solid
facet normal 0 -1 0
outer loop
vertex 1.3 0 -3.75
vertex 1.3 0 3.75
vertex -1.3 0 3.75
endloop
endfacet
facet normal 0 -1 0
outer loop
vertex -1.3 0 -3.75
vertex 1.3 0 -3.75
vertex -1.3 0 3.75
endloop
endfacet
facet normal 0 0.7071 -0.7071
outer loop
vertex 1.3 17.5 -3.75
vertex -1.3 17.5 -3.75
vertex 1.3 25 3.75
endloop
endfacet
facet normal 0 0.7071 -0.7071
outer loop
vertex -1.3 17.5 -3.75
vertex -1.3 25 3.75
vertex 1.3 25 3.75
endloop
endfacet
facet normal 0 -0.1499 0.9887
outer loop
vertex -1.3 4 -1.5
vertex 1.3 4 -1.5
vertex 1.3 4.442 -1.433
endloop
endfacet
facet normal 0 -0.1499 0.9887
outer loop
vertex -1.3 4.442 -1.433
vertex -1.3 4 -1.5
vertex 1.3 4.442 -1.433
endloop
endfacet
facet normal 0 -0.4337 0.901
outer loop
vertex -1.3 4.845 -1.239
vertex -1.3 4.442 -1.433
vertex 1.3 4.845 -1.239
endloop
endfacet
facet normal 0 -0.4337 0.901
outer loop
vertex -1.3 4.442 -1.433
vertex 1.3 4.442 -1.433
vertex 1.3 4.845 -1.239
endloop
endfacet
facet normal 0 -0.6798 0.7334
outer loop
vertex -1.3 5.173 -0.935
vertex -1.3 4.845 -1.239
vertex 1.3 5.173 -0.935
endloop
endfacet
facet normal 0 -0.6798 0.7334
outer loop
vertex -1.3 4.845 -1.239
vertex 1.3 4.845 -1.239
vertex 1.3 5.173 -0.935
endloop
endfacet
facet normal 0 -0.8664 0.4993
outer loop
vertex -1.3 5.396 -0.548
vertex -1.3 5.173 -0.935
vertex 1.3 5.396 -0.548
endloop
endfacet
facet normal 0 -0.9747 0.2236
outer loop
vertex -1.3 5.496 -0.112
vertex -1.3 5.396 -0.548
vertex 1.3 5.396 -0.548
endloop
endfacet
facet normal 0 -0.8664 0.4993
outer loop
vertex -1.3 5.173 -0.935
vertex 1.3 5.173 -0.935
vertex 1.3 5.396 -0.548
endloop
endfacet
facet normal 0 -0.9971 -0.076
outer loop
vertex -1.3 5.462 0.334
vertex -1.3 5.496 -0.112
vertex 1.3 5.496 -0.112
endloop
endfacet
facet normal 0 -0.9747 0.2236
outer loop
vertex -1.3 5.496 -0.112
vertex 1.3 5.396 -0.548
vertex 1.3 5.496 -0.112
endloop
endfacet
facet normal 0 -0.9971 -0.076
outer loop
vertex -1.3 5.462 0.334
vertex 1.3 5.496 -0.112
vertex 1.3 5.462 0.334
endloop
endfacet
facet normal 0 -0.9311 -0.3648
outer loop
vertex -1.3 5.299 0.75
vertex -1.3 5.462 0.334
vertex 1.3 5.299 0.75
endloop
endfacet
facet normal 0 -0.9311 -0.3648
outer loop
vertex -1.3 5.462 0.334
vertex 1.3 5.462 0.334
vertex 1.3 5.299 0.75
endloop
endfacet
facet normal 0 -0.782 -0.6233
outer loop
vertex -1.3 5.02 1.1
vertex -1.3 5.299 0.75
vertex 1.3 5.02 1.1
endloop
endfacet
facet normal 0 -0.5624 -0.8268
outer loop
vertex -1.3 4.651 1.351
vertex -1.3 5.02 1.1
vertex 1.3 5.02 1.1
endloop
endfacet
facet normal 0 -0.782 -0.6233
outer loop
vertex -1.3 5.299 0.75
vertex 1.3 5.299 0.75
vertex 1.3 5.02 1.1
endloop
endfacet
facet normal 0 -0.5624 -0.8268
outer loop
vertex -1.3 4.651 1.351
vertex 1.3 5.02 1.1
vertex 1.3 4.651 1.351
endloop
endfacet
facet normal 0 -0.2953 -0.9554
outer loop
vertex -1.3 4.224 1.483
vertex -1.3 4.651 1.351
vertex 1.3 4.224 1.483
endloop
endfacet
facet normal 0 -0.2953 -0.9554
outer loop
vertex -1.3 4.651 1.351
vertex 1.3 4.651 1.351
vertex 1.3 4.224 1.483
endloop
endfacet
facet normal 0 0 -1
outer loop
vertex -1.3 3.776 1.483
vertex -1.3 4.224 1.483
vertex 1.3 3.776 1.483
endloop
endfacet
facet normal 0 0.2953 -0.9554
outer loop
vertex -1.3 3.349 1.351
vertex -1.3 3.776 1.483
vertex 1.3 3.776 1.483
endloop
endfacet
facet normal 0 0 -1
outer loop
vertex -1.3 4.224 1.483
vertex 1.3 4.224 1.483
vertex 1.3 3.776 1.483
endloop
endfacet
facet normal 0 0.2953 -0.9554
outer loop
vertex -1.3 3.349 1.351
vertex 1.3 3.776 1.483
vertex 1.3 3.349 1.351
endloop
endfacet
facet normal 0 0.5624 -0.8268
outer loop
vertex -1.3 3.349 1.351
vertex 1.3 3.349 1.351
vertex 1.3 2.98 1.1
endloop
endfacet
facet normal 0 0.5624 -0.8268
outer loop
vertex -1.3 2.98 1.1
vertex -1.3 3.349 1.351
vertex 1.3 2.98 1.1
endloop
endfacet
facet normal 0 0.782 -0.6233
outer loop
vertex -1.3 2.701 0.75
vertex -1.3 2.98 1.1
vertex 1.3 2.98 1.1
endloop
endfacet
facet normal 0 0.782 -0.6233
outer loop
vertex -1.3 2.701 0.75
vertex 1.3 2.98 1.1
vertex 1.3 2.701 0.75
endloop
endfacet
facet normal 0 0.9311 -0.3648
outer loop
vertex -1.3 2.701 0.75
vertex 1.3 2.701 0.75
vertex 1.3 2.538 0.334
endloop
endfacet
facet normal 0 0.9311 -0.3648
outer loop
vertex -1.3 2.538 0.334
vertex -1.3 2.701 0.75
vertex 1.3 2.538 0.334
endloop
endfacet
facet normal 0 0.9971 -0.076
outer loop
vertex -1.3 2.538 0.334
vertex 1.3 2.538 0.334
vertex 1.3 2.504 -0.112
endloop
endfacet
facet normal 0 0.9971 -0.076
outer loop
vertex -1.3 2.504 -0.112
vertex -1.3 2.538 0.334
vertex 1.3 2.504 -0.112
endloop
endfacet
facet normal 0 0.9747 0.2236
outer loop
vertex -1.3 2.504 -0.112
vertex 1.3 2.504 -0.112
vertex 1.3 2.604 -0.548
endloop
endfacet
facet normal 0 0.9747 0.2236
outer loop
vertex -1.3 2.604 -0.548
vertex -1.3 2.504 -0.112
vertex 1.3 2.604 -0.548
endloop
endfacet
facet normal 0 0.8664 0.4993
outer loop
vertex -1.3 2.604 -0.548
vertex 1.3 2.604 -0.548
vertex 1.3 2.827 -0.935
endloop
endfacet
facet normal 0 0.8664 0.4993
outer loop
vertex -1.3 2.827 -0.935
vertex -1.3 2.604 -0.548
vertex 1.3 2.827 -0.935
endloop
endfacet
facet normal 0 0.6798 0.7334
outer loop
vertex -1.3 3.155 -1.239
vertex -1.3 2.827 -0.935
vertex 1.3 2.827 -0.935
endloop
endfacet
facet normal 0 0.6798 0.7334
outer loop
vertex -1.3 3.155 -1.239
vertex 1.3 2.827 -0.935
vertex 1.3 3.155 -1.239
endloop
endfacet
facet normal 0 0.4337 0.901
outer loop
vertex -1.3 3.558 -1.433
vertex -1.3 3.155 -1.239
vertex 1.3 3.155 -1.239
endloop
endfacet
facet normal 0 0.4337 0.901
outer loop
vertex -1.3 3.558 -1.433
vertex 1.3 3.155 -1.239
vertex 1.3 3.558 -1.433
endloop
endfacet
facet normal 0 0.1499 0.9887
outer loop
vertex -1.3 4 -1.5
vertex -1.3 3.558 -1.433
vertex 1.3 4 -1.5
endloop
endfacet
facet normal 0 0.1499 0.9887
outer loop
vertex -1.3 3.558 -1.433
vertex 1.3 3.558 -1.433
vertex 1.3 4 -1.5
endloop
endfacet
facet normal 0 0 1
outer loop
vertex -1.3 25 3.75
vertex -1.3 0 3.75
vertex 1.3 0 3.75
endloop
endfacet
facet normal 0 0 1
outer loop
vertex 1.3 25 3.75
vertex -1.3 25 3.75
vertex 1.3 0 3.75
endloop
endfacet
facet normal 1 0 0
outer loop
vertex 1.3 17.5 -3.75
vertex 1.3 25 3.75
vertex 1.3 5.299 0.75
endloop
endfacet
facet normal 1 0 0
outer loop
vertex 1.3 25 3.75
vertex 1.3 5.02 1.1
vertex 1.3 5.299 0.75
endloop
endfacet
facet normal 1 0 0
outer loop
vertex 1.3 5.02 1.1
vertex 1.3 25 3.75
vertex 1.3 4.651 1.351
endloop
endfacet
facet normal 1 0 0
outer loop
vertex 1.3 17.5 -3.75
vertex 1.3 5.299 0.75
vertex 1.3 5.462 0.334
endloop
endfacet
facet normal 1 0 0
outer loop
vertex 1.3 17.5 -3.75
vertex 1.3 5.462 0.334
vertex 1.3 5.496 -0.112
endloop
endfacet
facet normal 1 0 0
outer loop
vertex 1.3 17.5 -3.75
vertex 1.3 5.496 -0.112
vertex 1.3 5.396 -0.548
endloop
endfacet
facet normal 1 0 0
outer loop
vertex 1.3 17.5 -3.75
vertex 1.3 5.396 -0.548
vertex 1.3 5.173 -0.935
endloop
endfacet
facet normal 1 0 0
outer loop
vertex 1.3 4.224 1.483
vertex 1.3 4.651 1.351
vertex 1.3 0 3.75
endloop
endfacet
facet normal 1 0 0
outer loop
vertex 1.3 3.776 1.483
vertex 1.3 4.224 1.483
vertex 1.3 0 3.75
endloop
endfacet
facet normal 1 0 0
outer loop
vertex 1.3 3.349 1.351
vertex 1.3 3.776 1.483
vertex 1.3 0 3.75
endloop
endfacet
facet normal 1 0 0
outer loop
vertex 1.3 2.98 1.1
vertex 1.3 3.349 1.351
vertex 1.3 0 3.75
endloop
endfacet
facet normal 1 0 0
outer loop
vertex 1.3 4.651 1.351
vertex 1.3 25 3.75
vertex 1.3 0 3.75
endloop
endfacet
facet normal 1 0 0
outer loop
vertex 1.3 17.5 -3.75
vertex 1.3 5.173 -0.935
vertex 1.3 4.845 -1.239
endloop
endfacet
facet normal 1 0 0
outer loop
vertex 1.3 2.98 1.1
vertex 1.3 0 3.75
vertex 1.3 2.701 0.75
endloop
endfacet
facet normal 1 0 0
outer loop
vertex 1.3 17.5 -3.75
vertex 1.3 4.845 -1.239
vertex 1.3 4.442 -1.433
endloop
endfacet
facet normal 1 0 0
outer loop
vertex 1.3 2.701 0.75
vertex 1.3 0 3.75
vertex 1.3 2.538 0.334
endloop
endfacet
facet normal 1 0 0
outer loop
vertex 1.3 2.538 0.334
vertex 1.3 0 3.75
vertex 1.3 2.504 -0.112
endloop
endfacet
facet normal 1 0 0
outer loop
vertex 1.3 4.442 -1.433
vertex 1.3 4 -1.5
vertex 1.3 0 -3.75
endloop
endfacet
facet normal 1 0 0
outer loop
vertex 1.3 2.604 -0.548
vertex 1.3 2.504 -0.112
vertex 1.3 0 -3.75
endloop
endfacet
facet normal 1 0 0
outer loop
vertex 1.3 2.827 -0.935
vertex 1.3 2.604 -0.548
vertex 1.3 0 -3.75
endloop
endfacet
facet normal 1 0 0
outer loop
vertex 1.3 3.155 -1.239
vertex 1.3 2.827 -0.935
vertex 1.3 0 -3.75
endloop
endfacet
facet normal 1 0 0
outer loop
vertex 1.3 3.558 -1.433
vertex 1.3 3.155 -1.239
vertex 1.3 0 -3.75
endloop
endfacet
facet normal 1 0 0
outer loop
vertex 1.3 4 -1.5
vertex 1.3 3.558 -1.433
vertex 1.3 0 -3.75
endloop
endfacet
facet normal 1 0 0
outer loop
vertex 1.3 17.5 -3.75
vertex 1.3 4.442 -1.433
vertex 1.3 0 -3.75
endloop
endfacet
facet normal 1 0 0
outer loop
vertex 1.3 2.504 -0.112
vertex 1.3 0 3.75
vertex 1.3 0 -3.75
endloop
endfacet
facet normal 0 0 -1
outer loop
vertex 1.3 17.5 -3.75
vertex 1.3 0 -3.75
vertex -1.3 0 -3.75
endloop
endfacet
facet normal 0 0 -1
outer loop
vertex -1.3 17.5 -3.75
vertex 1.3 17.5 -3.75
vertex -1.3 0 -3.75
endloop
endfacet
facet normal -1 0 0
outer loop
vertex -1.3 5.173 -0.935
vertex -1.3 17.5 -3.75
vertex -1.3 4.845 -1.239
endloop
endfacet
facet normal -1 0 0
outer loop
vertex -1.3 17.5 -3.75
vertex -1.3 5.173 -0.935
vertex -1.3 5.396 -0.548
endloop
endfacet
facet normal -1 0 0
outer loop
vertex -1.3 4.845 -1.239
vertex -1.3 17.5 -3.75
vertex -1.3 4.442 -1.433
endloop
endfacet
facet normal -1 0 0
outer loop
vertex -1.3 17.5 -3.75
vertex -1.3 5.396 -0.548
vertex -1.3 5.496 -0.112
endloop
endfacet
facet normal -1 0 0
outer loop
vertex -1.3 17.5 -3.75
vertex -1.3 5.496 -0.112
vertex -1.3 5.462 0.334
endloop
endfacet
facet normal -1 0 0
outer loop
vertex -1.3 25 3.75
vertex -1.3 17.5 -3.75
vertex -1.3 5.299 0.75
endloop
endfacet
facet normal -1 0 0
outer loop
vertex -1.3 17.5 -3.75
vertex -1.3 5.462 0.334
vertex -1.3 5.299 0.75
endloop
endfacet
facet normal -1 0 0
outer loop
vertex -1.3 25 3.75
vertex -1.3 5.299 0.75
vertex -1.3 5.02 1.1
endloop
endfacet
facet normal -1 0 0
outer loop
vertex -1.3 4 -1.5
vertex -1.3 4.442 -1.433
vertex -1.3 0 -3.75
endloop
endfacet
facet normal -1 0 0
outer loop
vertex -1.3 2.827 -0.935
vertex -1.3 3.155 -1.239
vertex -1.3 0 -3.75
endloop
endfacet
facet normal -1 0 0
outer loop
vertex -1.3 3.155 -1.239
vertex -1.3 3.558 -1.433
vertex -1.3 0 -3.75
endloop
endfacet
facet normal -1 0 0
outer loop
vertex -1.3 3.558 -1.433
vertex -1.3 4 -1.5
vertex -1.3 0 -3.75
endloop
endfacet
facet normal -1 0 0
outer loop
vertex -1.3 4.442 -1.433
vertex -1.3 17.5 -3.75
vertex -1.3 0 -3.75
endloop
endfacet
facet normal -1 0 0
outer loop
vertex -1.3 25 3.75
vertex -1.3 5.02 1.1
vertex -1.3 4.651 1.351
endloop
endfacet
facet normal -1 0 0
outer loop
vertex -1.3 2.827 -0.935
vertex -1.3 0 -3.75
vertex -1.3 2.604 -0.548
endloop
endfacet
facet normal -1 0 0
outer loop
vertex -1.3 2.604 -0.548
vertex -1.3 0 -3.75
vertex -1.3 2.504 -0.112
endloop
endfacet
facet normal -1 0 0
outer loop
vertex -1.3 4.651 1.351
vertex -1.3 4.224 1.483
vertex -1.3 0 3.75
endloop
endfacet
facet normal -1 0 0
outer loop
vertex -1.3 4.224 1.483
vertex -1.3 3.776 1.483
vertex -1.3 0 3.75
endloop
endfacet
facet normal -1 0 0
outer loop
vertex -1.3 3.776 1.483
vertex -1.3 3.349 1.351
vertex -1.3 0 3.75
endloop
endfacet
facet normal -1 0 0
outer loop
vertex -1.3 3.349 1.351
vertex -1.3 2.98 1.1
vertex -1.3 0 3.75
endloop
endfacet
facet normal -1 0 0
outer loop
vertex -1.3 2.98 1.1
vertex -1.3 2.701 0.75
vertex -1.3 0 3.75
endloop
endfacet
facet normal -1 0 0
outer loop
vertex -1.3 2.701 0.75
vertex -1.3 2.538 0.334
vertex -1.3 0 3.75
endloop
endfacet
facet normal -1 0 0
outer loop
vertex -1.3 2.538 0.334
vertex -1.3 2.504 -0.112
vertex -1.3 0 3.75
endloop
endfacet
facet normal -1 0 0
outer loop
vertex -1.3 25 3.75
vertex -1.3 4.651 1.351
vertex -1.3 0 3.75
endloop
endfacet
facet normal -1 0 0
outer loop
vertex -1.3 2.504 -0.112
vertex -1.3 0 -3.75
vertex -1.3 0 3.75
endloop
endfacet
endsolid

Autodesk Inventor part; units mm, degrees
ref_plane "YZ Plane" through (0, 0, 0) normal (1, 0, 0) x (0, 1, 0)
ref_plane "XZ Plane" through (0, 0, 0) normal (0, 1, 0) x (-1, 0, 0)
ref_plane "XY Plane" through (0, 0, 0) normal (0, 0, 1) x (1, 0, 0)
sketch "Sketch1" plane through (0, 0, 0) normal (0, 1, 0) x (-1, 0, 0)
  line L0 (-1.3, -3.75) -> (1.3, -3.75)
  line L1 (1.3, -3.75) -> (1.3, 3.75)
  line L2 (1.3, 3.75) -> (-1.3, 3.75)
  line L3 (-1.3, 3.75) -> (-1.3, -3.75)
  line L4 (-1.3, -3.75) -> (1.3, 3.75) construction
  line L5 (1.3, -3.75) -> (-1.3, 3.75) construction
  point P0 (0, 0)
  dimension "d0" = 2.6
  dimension "d1" = 7.5
extrude "Extrusion1" add sketch "Sketch1" along normal blind 25
chamfer "Chamfer1" distance 7.5 angle 45 1 edges at (0, 25, -3.75)
sketch "Sketch2" plane through (1.3, 0, 3.75) normal (1, 0, 0) x (0, 0, -1)
  circle A0 centre (3.75, 4) radius 1.5
  point P0 (3.75, 0)
  dimension "d7" = 3
  dimension "d8" = 4
extrude "Extrusion2" cut sketch "Sketch2" against normal blind 16
properties part number "locker"
